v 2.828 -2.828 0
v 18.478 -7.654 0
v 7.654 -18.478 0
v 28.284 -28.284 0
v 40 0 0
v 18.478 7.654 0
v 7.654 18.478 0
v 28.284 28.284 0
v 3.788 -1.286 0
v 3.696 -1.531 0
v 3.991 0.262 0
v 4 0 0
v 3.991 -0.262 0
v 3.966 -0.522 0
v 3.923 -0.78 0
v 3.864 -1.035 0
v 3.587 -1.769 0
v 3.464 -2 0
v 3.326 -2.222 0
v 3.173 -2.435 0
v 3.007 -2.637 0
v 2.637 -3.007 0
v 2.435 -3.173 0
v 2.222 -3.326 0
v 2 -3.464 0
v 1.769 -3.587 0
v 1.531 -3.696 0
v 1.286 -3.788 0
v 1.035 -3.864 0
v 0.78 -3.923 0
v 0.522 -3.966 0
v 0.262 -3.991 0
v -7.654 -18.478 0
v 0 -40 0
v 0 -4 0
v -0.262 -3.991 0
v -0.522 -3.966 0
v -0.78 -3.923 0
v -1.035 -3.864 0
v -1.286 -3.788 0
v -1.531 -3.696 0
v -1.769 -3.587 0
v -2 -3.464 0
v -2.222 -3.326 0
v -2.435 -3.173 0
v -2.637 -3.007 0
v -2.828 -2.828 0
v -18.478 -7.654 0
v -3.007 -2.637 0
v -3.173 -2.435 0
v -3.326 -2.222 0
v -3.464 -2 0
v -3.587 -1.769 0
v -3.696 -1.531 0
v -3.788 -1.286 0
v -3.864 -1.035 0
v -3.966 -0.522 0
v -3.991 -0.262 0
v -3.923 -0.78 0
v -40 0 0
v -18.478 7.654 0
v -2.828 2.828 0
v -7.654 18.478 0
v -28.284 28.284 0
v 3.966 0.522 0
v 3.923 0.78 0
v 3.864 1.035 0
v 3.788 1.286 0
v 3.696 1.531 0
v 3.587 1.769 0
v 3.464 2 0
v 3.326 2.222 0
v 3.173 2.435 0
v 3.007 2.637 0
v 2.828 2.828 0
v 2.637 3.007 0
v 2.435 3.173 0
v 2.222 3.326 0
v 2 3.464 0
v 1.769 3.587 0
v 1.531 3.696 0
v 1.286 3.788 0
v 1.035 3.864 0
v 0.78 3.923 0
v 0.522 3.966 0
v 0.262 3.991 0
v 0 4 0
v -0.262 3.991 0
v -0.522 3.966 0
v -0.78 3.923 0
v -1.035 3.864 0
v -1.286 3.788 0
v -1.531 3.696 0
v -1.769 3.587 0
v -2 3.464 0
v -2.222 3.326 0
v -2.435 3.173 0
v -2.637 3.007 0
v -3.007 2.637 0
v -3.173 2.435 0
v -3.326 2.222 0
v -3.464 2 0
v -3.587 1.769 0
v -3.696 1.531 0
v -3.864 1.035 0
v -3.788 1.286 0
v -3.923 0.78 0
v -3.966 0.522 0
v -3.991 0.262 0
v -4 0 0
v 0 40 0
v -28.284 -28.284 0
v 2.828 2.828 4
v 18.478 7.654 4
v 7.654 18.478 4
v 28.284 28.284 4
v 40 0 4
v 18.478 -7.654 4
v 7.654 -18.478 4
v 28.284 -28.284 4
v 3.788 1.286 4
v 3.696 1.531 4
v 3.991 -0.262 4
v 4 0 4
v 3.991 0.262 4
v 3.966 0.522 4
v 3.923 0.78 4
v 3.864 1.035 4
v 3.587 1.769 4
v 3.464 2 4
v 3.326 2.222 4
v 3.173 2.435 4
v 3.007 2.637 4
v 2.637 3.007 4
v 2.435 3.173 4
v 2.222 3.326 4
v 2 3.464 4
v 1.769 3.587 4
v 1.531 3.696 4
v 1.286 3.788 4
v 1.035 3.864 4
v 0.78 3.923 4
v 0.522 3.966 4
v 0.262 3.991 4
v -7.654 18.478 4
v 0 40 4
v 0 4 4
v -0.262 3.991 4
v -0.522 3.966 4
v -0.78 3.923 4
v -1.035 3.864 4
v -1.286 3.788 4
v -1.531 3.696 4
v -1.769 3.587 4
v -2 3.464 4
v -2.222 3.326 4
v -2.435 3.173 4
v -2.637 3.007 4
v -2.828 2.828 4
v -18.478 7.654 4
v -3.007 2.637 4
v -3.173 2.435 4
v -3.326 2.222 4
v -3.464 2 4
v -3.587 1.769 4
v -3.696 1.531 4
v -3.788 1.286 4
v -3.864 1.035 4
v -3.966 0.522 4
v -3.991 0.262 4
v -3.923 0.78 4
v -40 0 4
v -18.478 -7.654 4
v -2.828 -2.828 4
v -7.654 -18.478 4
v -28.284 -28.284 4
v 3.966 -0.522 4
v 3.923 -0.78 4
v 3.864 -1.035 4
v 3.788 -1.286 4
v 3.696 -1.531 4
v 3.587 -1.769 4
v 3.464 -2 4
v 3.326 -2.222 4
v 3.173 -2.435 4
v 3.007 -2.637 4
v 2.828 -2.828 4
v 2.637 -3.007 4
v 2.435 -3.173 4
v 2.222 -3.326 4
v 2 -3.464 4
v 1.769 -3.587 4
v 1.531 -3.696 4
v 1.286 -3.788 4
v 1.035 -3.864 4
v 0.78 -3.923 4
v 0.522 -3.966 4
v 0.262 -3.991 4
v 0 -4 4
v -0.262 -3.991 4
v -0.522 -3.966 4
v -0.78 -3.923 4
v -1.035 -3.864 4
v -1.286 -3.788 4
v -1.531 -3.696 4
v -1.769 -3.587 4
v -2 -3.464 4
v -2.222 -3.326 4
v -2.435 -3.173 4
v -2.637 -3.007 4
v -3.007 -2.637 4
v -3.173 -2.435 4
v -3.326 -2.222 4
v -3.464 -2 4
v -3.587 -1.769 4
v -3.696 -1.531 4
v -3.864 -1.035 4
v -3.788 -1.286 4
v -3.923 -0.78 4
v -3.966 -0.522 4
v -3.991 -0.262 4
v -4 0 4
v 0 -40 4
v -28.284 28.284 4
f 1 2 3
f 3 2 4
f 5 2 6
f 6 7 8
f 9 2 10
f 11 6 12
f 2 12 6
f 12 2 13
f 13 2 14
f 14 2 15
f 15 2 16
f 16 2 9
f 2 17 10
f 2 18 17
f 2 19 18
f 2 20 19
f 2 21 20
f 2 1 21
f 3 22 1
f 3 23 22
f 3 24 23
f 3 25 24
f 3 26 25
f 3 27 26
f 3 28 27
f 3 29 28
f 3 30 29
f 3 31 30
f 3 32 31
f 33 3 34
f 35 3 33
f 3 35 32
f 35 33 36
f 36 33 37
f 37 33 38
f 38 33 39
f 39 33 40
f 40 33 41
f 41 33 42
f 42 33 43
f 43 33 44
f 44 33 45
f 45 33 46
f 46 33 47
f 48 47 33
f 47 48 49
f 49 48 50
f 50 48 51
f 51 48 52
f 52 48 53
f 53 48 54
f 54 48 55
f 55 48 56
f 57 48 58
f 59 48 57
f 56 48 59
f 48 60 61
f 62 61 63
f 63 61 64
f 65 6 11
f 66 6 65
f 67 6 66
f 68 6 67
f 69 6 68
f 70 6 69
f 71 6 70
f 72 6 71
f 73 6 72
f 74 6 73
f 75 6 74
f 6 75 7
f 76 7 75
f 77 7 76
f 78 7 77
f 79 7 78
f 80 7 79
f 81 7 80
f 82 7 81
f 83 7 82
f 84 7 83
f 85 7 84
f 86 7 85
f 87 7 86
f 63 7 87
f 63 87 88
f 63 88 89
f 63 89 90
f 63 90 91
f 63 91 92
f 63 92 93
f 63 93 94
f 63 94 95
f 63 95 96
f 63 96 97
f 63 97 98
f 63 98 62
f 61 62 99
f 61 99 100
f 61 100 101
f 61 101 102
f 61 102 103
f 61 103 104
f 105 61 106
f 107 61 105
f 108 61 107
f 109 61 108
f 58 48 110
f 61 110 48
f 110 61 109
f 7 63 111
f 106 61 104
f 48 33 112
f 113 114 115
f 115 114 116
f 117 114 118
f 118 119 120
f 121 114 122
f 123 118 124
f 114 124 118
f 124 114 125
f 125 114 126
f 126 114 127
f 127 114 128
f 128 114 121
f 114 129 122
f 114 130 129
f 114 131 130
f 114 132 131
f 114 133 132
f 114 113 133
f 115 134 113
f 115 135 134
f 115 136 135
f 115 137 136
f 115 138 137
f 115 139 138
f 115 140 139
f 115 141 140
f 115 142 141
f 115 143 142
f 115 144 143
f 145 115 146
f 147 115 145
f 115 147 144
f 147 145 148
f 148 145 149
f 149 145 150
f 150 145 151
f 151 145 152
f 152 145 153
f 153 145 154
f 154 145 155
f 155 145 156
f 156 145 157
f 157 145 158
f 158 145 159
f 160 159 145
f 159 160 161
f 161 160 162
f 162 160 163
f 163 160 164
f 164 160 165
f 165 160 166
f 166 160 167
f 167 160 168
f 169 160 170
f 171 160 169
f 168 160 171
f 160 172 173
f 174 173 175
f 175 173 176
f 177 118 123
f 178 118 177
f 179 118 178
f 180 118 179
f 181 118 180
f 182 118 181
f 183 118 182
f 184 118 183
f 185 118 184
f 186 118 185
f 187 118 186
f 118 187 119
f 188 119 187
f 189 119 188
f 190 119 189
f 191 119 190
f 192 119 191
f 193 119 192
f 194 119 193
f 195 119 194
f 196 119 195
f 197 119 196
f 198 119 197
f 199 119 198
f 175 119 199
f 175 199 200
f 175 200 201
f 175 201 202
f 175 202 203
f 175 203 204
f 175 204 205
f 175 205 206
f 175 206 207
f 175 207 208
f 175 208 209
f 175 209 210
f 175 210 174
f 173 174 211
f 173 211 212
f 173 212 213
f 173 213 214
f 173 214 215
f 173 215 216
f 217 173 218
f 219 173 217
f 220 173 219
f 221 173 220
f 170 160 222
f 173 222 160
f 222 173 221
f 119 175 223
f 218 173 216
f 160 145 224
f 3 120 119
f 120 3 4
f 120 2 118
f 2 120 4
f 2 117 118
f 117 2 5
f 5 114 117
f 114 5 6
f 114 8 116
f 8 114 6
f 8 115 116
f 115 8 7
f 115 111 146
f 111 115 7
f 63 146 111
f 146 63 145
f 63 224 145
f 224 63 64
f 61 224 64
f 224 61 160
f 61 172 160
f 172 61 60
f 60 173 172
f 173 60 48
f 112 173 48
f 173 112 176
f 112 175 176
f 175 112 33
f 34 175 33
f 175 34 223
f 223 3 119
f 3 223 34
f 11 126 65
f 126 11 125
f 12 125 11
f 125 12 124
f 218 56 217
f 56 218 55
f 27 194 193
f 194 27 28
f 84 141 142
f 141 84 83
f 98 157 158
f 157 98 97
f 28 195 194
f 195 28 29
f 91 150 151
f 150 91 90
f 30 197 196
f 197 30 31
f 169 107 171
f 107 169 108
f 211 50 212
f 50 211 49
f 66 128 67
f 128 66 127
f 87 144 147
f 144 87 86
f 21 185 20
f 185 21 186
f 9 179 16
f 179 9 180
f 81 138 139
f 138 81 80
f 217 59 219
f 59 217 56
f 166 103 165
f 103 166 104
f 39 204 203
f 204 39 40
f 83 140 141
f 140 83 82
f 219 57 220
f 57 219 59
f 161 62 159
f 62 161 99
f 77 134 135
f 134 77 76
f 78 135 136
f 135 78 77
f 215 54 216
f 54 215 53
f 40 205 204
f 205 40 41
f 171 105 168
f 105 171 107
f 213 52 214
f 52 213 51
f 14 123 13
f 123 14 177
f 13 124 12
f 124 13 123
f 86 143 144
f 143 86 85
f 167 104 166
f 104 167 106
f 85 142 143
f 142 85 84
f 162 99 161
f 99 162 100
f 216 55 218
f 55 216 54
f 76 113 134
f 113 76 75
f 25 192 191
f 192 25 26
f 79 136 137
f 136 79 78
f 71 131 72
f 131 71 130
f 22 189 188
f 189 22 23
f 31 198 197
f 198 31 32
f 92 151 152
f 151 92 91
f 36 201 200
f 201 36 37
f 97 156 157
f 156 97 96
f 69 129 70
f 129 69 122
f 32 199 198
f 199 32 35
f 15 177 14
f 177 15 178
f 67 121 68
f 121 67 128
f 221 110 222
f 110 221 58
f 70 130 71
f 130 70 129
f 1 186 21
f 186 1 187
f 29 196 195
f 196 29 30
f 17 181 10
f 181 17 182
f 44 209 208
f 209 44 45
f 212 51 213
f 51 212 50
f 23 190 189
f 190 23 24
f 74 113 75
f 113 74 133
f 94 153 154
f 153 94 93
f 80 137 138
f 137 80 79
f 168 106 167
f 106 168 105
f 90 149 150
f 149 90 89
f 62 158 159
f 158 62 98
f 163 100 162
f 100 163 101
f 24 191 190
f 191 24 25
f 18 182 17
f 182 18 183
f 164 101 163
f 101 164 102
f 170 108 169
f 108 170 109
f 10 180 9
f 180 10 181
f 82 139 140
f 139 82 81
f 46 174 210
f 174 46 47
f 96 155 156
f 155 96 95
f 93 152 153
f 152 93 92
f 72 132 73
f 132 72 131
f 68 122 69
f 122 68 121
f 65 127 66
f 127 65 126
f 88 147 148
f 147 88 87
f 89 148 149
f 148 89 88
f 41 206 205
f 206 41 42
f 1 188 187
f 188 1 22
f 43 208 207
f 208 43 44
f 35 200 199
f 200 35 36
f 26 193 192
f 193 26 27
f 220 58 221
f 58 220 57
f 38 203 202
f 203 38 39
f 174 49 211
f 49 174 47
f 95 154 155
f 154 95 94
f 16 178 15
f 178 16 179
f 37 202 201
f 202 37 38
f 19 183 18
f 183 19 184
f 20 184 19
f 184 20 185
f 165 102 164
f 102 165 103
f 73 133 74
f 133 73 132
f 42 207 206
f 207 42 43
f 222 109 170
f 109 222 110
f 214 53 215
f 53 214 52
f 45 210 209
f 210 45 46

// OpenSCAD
// 8-pointed star indexing wheel
// Print orientation: flat on the bed, building up +Z

// ---- Parameters ----
n_points   = 8;    // number of star points
r_outer    = 40;   // radius of outer (tip) points [mm]
r_inner    = 20;   // radius of inner (valley) points [mm]
thickness  = 4;    // plate thickness [mm]
hole_d     = 8;    // centre hole diameter [mm]
eps        = 0.5;  // cutter overshoot past faces [mm]
$fn        = 96;   // curve resolution

// ---- Star outline points ----
// Alternates outer/inner, first outer point on +X axis
star_pts = [
    for (i = [0 : 2 * n_points - 1])
        let (r = (i % 2 == 0) ? r_outer : r_inner,
             a = i * 180 / n_points)
        [r * cos(a), r * sin(a)]
];

// ---- Part ----
difference() {
    linear_extrude(height = thickness)
        polygon(star_pts);

    // centre through-hole
    translate([0, 0, -eps])
        cylinder(d = hole_d, h = thickness + 2 * eps, $fn = 96);
}
